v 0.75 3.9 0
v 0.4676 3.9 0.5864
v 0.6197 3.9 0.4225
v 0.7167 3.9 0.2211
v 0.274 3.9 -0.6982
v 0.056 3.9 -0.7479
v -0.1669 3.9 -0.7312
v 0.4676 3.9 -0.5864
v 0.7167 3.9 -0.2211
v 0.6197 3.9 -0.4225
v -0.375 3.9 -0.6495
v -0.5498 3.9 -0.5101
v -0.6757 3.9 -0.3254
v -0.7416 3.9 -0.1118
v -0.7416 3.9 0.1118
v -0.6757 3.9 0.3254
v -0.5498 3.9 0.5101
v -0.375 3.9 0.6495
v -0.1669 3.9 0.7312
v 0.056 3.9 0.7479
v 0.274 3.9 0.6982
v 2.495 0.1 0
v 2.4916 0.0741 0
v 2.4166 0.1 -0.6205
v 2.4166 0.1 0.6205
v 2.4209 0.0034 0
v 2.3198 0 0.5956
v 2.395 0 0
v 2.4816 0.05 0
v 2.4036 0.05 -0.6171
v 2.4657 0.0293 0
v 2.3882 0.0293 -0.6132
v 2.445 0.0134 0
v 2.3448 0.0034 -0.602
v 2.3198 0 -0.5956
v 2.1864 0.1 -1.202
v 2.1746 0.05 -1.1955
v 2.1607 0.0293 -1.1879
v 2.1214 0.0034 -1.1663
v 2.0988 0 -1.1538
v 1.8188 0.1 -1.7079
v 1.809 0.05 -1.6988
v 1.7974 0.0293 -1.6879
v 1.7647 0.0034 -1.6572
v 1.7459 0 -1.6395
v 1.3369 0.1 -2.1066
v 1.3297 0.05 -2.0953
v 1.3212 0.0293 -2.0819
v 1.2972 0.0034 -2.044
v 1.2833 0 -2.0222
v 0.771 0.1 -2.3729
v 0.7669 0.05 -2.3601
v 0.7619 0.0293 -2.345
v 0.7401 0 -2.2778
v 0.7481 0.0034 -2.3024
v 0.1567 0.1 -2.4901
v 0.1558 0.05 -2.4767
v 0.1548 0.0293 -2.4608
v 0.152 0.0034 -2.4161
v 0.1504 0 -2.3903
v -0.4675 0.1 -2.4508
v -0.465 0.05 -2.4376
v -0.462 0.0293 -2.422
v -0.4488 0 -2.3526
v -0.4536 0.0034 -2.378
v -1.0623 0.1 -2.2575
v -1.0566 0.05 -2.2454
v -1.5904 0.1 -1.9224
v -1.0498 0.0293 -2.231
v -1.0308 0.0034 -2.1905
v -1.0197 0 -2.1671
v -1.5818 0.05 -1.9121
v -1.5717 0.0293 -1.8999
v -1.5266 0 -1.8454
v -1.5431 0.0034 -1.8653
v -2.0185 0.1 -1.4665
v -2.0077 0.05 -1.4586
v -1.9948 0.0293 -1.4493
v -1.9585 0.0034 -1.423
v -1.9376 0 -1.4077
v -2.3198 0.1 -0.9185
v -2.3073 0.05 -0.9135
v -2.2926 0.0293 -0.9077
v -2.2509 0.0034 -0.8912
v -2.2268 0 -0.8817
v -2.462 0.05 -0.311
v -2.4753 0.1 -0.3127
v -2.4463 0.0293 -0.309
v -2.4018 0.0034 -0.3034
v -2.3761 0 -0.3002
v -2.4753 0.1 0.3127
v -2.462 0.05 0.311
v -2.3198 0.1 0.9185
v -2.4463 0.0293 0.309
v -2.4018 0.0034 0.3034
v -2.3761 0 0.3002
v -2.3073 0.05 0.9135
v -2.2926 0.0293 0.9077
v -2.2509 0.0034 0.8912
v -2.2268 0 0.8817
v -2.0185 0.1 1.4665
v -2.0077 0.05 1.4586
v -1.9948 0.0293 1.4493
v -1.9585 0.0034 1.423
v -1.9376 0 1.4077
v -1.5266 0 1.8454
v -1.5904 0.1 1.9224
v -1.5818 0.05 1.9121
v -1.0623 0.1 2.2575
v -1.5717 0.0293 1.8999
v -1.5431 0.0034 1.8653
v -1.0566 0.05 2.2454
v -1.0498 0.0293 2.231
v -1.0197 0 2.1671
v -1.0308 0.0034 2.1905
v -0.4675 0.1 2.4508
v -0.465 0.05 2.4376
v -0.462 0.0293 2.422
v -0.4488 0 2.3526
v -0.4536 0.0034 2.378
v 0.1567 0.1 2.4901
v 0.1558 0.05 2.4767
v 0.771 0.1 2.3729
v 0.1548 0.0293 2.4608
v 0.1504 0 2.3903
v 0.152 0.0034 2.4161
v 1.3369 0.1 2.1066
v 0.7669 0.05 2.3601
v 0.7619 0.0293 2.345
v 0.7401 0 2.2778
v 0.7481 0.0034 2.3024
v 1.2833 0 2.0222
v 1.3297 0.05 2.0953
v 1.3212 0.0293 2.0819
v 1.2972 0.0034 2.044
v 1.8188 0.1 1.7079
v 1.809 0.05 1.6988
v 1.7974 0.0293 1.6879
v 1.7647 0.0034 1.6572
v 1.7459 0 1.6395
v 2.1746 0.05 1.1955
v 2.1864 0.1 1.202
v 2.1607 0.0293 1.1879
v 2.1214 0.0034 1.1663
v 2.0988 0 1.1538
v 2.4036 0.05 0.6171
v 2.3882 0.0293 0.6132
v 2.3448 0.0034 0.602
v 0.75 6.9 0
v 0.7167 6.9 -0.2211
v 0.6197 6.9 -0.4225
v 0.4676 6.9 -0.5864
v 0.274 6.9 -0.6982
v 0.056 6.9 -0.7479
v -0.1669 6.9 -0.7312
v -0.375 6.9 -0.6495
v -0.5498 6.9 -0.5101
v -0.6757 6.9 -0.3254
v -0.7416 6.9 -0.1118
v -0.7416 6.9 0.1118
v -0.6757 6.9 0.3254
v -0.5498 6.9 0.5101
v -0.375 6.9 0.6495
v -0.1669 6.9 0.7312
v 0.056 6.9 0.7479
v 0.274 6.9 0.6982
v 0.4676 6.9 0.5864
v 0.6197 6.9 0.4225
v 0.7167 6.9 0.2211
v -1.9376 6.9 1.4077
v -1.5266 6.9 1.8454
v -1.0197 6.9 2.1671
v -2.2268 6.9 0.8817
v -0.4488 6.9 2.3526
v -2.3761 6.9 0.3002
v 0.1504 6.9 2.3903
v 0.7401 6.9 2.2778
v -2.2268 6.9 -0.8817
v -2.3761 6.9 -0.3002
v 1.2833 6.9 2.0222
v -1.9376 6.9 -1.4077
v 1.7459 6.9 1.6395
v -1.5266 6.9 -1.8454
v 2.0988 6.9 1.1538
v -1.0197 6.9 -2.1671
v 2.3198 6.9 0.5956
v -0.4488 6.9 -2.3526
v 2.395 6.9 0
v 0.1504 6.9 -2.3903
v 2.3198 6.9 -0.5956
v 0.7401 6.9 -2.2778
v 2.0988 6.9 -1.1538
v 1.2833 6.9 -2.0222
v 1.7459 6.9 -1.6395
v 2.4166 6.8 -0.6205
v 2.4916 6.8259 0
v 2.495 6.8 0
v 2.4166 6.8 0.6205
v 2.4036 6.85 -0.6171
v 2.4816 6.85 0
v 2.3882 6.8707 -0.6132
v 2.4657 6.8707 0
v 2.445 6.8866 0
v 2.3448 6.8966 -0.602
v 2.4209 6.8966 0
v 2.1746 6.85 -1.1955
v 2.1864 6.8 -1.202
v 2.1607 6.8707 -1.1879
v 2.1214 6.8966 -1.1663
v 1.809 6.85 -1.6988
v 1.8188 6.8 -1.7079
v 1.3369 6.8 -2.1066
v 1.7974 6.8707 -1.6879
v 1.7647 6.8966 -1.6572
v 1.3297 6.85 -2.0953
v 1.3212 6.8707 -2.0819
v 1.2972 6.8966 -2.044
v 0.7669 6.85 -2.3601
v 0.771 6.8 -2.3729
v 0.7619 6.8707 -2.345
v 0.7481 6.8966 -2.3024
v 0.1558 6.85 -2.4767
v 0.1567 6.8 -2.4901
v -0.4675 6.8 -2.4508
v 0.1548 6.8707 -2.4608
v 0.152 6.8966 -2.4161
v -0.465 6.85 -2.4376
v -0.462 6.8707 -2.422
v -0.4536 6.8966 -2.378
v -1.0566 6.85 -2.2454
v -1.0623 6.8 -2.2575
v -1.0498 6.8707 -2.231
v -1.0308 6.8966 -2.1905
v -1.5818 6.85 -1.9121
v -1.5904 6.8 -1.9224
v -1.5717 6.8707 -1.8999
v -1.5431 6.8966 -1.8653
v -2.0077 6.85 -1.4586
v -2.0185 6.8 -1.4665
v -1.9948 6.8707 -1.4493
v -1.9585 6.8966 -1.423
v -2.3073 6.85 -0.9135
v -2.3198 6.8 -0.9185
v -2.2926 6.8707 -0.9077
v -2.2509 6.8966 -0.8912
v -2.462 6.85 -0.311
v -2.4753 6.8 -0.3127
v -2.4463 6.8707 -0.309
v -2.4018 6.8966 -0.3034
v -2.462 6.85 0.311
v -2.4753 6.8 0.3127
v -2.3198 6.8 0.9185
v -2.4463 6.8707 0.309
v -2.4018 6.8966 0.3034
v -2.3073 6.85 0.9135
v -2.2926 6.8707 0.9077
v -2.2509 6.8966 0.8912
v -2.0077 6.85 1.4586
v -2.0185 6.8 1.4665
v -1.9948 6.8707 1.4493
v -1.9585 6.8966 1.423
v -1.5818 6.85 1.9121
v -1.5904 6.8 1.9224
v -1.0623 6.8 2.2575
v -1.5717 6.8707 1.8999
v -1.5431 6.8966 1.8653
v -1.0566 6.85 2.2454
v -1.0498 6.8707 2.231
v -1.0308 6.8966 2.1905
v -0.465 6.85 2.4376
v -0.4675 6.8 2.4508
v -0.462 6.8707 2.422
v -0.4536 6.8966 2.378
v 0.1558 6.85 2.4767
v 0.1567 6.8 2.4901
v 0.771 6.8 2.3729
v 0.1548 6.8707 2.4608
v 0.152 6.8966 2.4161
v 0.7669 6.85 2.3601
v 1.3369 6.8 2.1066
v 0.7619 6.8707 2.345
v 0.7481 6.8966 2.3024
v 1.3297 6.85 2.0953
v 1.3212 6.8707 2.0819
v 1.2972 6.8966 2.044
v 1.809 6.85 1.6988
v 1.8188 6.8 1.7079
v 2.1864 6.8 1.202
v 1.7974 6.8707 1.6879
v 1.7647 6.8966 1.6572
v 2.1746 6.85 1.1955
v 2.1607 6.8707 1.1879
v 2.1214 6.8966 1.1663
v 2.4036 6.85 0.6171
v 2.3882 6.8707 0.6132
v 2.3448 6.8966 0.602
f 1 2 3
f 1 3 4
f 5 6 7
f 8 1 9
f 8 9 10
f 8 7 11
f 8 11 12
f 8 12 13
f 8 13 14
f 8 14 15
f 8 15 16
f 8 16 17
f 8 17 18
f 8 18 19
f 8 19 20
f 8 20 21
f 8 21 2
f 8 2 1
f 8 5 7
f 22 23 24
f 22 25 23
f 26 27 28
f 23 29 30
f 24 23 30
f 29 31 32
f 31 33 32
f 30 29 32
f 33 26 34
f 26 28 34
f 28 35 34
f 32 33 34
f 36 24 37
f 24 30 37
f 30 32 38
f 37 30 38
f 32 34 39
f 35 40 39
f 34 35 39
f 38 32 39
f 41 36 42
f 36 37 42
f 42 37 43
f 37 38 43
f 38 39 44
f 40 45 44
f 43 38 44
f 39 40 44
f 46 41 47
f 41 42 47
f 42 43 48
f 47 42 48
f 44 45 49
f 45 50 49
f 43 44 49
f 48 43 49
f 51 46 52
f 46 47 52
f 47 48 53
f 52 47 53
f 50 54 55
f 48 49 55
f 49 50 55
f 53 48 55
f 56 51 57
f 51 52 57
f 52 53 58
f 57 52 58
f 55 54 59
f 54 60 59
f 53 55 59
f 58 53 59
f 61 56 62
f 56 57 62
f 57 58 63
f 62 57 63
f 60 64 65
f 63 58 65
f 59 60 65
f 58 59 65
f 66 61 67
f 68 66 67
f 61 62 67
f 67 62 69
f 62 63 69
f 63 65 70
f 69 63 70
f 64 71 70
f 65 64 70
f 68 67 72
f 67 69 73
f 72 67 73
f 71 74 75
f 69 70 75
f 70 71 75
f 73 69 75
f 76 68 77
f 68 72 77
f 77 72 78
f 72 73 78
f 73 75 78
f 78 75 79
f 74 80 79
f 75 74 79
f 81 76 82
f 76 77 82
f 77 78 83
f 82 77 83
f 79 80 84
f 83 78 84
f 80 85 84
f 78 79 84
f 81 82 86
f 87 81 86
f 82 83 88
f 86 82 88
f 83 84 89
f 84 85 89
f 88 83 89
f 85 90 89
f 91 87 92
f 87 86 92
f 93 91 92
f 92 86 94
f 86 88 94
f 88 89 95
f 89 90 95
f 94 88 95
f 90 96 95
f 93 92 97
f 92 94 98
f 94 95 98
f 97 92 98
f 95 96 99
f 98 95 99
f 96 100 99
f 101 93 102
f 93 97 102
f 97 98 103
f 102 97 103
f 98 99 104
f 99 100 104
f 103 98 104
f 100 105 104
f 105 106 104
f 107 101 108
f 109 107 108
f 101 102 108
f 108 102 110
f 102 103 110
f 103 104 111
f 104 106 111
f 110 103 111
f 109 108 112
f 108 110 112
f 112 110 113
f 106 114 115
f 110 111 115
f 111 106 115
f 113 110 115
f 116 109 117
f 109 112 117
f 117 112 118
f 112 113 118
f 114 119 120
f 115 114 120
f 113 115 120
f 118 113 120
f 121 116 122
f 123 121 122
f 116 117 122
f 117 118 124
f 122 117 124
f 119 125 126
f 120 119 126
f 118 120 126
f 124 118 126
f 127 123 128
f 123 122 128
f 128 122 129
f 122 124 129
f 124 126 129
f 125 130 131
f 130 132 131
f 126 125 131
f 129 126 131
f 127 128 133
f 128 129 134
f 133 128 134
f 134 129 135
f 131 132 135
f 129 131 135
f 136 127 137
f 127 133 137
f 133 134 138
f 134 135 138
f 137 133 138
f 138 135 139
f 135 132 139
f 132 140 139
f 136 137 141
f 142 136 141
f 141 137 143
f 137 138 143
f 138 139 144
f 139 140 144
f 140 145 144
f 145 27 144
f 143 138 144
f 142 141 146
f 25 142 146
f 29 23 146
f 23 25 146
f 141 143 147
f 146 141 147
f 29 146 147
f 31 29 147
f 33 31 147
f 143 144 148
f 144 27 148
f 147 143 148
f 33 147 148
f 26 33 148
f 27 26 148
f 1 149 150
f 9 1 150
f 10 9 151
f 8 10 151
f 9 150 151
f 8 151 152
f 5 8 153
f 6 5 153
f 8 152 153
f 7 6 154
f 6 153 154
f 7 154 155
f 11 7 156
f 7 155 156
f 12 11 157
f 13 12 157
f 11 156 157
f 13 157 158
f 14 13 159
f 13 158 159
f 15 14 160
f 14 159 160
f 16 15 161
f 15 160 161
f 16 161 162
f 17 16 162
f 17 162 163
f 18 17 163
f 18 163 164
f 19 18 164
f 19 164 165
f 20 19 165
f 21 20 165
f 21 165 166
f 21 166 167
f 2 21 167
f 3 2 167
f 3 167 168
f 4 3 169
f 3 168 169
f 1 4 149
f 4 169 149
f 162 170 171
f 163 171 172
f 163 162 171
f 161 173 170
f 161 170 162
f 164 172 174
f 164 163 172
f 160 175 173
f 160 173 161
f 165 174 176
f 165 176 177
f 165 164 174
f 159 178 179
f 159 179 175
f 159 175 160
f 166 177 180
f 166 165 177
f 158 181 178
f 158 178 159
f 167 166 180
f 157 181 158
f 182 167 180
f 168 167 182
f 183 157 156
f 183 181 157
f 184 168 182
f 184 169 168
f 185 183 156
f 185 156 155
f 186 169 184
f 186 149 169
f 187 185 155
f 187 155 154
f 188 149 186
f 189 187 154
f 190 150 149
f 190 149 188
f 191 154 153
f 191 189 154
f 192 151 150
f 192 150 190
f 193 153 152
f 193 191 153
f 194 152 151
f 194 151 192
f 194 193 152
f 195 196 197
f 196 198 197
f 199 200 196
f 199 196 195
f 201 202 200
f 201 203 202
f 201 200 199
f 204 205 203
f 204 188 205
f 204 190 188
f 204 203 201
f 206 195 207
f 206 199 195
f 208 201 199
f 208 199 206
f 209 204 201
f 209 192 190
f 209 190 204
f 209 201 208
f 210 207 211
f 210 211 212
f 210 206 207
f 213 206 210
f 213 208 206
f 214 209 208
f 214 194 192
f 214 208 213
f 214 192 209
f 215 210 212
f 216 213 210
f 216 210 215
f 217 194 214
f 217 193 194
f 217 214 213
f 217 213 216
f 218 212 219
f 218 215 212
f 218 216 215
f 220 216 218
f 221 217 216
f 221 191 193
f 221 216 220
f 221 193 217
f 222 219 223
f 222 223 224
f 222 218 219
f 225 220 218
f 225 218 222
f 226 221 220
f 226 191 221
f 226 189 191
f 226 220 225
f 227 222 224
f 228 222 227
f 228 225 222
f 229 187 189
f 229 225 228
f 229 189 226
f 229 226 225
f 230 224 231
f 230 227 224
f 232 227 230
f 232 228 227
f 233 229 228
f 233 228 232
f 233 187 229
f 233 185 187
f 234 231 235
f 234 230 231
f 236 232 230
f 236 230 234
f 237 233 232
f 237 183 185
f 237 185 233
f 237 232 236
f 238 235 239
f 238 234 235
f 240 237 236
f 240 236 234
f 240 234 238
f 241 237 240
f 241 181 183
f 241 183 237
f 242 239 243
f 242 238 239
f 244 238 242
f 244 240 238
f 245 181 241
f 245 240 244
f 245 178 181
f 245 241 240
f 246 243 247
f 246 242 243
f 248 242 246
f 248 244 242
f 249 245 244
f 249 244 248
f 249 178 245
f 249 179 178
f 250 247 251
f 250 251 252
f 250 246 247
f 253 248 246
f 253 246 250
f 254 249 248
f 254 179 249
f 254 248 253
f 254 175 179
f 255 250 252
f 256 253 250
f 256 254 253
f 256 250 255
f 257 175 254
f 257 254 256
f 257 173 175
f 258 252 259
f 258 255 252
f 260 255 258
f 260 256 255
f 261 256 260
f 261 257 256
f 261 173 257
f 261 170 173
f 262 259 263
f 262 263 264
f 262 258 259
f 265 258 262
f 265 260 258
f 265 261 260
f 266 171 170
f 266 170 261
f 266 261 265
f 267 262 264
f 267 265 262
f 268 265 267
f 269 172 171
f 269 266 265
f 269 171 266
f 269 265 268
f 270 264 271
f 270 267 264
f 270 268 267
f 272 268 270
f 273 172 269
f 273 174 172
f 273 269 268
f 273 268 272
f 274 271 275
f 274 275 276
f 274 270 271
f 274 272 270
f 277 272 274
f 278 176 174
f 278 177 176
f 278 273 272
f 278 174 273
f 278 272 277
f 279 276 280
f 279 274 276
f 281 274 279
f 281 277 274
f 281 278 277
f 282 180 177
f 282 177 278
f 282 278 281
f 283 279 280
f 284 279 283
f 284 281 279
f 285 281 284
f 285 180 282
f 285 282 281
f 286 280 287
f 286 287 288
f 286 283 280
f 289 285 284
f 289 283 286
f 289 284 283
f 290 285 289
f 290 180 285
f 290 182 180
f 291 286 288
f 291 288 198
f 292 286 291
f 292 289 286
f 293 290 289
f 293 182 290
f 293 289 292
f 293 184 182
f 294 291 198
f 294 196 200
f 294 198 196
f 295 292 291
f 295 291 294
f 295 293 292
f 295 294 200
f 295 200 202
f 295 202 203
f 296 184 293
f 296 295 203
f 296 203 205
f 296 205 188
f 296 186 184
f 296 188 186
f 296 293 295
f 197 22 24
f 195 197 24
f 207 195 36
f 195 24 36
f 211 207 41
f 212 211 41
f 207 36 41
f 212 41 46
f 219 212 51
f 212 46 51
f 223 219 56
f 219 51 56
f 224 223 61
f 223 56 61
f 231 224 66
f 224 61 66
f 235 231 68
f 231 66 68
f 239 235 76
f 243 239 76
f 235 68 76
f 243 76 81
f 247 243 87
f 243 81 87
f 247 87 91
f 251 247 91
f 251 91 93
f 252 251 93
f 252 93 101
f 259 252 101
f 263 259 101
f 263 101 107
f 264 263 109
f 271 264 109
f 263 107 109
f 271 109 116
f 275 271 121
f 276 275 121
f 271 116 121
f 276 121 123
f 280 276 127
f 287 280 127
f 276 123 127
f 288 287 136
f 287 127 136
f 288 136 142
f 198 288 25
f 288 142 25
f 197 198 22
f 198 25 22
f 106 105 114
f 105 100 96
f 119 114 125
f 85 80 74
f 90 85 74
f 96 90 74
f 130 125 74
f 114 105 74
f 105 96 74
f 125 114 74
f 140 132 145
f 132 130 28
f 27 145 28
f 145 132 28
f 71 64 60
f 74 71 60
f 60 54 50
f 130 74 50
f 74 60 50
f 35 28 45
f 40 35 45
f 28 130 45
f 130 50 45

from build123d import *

# Parameters (mm, degrees)
CROQUIS1_R              = 2.495
SALIENTE_EXTRUIR1_DEPTH = 6.9
REDONDEO1_R             = 0.1
CROQUIS2_R              = 0.75
CORTAR_EXTRUIR1_DEPTH   = 3


with BuildPart() as part:
    # Croquis1 → Saliente-Extruir1 (new body)
    with BuildSketch(Plane(origin=(0, 0, 0), x_dir=(1, 0, 0), z_dir=(0, 1, 0))):
        Circle(CROQUIS1_R)
    extrude(amount=SALIENTE_EXTRUIR1_DEPTH)

    # Redondeo1
    redondeo1_edges = [part.edges().sort_by_distance(p)[0] for p in [
        (-2.495, 0, 0),
        (-2.495, 6.9, 0),
    ]]
    fillet(redondeo1_edges, radius=REDONDEO1_R)

    # Croquis2 → Cortar-Extruir1 (cut)
    with BuildSketch(Plane(origin=(0, 6.9, 0), x_dir=(1, 0, 0), z_dir=(0, 1, 0))):
        Circle(CROQUIS2_R)
    extrude(amount=-CORTAR_EXTRUIR1_DEPTH, mode=Mode.SUBTRACT)


solid = part.part
